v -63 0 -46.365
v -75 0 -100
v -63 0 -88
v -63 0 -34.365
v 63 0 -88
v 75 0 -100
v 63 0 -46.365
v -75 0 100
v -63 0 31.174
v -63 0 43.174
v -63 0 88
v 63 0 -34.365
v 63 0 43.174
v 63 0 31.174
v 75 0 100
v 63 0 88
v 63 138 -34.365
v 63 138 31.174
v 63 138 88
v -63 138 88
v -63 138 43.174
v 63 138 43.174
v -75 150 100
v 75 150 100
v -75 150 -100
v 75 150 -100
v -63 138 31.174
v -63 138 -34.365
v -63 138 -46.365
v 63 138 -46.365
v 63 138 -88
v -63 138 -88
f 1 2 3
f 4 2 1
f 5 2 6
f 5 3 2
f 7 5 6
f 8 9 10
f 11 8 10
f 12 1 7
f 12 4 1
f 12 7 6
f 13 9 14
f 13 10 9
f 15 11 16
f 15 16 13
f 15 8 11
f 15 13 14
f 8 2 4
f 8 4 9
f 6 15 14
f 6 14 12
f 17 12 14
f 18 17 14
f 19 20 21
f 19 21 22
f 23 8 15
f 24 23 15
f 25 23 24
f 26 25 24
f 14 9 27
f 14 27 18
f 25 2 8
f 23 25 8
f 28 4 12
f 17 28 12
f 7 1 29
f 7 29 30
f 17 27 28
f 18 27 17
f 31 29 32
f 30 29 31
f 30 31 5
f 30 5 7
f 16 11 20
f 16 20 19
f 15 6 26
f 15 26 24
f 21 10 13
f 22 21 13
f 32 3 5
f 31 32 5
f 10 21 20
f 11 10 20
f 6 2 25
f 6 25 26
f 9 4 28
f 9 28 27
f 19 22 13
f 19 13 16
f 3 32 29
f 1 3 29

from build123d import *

# Parameters (mm, degrees)
F0_W     = 150
F0_H     = 200
F1_DEPTH = 150
F2_T     = -12
F3_W     = 126
F3_H     = 12
F4_DEPTH = 140


with BuildPart() as f1:
    # F0 (on Front) → F1 (new body)
    with BuildSketch(Plane.XZ):
        Rectangle(F0_W, F0_H)
    extrude(amount=-F1_DEPTH)

    # F2
    f2_openings = [f1.faces().sort_by_distance(p)[0] for p in [
        (0, 0, 0),
    ]]
    offset(amount=F2_T, openings=f2_openings)

    # F3 (on face) → F4 (join)
    with BuildSketch(Plane.XZ):
        with Locations((0, 37.173926213)):
            Rectangle(F3_W, F3_H)
        with Locations((0, -40.3645330455)):
            Rectangle(F3_W, F3_H)
    extrude(amount=-F4_DEPTH)


solid = f1.part
